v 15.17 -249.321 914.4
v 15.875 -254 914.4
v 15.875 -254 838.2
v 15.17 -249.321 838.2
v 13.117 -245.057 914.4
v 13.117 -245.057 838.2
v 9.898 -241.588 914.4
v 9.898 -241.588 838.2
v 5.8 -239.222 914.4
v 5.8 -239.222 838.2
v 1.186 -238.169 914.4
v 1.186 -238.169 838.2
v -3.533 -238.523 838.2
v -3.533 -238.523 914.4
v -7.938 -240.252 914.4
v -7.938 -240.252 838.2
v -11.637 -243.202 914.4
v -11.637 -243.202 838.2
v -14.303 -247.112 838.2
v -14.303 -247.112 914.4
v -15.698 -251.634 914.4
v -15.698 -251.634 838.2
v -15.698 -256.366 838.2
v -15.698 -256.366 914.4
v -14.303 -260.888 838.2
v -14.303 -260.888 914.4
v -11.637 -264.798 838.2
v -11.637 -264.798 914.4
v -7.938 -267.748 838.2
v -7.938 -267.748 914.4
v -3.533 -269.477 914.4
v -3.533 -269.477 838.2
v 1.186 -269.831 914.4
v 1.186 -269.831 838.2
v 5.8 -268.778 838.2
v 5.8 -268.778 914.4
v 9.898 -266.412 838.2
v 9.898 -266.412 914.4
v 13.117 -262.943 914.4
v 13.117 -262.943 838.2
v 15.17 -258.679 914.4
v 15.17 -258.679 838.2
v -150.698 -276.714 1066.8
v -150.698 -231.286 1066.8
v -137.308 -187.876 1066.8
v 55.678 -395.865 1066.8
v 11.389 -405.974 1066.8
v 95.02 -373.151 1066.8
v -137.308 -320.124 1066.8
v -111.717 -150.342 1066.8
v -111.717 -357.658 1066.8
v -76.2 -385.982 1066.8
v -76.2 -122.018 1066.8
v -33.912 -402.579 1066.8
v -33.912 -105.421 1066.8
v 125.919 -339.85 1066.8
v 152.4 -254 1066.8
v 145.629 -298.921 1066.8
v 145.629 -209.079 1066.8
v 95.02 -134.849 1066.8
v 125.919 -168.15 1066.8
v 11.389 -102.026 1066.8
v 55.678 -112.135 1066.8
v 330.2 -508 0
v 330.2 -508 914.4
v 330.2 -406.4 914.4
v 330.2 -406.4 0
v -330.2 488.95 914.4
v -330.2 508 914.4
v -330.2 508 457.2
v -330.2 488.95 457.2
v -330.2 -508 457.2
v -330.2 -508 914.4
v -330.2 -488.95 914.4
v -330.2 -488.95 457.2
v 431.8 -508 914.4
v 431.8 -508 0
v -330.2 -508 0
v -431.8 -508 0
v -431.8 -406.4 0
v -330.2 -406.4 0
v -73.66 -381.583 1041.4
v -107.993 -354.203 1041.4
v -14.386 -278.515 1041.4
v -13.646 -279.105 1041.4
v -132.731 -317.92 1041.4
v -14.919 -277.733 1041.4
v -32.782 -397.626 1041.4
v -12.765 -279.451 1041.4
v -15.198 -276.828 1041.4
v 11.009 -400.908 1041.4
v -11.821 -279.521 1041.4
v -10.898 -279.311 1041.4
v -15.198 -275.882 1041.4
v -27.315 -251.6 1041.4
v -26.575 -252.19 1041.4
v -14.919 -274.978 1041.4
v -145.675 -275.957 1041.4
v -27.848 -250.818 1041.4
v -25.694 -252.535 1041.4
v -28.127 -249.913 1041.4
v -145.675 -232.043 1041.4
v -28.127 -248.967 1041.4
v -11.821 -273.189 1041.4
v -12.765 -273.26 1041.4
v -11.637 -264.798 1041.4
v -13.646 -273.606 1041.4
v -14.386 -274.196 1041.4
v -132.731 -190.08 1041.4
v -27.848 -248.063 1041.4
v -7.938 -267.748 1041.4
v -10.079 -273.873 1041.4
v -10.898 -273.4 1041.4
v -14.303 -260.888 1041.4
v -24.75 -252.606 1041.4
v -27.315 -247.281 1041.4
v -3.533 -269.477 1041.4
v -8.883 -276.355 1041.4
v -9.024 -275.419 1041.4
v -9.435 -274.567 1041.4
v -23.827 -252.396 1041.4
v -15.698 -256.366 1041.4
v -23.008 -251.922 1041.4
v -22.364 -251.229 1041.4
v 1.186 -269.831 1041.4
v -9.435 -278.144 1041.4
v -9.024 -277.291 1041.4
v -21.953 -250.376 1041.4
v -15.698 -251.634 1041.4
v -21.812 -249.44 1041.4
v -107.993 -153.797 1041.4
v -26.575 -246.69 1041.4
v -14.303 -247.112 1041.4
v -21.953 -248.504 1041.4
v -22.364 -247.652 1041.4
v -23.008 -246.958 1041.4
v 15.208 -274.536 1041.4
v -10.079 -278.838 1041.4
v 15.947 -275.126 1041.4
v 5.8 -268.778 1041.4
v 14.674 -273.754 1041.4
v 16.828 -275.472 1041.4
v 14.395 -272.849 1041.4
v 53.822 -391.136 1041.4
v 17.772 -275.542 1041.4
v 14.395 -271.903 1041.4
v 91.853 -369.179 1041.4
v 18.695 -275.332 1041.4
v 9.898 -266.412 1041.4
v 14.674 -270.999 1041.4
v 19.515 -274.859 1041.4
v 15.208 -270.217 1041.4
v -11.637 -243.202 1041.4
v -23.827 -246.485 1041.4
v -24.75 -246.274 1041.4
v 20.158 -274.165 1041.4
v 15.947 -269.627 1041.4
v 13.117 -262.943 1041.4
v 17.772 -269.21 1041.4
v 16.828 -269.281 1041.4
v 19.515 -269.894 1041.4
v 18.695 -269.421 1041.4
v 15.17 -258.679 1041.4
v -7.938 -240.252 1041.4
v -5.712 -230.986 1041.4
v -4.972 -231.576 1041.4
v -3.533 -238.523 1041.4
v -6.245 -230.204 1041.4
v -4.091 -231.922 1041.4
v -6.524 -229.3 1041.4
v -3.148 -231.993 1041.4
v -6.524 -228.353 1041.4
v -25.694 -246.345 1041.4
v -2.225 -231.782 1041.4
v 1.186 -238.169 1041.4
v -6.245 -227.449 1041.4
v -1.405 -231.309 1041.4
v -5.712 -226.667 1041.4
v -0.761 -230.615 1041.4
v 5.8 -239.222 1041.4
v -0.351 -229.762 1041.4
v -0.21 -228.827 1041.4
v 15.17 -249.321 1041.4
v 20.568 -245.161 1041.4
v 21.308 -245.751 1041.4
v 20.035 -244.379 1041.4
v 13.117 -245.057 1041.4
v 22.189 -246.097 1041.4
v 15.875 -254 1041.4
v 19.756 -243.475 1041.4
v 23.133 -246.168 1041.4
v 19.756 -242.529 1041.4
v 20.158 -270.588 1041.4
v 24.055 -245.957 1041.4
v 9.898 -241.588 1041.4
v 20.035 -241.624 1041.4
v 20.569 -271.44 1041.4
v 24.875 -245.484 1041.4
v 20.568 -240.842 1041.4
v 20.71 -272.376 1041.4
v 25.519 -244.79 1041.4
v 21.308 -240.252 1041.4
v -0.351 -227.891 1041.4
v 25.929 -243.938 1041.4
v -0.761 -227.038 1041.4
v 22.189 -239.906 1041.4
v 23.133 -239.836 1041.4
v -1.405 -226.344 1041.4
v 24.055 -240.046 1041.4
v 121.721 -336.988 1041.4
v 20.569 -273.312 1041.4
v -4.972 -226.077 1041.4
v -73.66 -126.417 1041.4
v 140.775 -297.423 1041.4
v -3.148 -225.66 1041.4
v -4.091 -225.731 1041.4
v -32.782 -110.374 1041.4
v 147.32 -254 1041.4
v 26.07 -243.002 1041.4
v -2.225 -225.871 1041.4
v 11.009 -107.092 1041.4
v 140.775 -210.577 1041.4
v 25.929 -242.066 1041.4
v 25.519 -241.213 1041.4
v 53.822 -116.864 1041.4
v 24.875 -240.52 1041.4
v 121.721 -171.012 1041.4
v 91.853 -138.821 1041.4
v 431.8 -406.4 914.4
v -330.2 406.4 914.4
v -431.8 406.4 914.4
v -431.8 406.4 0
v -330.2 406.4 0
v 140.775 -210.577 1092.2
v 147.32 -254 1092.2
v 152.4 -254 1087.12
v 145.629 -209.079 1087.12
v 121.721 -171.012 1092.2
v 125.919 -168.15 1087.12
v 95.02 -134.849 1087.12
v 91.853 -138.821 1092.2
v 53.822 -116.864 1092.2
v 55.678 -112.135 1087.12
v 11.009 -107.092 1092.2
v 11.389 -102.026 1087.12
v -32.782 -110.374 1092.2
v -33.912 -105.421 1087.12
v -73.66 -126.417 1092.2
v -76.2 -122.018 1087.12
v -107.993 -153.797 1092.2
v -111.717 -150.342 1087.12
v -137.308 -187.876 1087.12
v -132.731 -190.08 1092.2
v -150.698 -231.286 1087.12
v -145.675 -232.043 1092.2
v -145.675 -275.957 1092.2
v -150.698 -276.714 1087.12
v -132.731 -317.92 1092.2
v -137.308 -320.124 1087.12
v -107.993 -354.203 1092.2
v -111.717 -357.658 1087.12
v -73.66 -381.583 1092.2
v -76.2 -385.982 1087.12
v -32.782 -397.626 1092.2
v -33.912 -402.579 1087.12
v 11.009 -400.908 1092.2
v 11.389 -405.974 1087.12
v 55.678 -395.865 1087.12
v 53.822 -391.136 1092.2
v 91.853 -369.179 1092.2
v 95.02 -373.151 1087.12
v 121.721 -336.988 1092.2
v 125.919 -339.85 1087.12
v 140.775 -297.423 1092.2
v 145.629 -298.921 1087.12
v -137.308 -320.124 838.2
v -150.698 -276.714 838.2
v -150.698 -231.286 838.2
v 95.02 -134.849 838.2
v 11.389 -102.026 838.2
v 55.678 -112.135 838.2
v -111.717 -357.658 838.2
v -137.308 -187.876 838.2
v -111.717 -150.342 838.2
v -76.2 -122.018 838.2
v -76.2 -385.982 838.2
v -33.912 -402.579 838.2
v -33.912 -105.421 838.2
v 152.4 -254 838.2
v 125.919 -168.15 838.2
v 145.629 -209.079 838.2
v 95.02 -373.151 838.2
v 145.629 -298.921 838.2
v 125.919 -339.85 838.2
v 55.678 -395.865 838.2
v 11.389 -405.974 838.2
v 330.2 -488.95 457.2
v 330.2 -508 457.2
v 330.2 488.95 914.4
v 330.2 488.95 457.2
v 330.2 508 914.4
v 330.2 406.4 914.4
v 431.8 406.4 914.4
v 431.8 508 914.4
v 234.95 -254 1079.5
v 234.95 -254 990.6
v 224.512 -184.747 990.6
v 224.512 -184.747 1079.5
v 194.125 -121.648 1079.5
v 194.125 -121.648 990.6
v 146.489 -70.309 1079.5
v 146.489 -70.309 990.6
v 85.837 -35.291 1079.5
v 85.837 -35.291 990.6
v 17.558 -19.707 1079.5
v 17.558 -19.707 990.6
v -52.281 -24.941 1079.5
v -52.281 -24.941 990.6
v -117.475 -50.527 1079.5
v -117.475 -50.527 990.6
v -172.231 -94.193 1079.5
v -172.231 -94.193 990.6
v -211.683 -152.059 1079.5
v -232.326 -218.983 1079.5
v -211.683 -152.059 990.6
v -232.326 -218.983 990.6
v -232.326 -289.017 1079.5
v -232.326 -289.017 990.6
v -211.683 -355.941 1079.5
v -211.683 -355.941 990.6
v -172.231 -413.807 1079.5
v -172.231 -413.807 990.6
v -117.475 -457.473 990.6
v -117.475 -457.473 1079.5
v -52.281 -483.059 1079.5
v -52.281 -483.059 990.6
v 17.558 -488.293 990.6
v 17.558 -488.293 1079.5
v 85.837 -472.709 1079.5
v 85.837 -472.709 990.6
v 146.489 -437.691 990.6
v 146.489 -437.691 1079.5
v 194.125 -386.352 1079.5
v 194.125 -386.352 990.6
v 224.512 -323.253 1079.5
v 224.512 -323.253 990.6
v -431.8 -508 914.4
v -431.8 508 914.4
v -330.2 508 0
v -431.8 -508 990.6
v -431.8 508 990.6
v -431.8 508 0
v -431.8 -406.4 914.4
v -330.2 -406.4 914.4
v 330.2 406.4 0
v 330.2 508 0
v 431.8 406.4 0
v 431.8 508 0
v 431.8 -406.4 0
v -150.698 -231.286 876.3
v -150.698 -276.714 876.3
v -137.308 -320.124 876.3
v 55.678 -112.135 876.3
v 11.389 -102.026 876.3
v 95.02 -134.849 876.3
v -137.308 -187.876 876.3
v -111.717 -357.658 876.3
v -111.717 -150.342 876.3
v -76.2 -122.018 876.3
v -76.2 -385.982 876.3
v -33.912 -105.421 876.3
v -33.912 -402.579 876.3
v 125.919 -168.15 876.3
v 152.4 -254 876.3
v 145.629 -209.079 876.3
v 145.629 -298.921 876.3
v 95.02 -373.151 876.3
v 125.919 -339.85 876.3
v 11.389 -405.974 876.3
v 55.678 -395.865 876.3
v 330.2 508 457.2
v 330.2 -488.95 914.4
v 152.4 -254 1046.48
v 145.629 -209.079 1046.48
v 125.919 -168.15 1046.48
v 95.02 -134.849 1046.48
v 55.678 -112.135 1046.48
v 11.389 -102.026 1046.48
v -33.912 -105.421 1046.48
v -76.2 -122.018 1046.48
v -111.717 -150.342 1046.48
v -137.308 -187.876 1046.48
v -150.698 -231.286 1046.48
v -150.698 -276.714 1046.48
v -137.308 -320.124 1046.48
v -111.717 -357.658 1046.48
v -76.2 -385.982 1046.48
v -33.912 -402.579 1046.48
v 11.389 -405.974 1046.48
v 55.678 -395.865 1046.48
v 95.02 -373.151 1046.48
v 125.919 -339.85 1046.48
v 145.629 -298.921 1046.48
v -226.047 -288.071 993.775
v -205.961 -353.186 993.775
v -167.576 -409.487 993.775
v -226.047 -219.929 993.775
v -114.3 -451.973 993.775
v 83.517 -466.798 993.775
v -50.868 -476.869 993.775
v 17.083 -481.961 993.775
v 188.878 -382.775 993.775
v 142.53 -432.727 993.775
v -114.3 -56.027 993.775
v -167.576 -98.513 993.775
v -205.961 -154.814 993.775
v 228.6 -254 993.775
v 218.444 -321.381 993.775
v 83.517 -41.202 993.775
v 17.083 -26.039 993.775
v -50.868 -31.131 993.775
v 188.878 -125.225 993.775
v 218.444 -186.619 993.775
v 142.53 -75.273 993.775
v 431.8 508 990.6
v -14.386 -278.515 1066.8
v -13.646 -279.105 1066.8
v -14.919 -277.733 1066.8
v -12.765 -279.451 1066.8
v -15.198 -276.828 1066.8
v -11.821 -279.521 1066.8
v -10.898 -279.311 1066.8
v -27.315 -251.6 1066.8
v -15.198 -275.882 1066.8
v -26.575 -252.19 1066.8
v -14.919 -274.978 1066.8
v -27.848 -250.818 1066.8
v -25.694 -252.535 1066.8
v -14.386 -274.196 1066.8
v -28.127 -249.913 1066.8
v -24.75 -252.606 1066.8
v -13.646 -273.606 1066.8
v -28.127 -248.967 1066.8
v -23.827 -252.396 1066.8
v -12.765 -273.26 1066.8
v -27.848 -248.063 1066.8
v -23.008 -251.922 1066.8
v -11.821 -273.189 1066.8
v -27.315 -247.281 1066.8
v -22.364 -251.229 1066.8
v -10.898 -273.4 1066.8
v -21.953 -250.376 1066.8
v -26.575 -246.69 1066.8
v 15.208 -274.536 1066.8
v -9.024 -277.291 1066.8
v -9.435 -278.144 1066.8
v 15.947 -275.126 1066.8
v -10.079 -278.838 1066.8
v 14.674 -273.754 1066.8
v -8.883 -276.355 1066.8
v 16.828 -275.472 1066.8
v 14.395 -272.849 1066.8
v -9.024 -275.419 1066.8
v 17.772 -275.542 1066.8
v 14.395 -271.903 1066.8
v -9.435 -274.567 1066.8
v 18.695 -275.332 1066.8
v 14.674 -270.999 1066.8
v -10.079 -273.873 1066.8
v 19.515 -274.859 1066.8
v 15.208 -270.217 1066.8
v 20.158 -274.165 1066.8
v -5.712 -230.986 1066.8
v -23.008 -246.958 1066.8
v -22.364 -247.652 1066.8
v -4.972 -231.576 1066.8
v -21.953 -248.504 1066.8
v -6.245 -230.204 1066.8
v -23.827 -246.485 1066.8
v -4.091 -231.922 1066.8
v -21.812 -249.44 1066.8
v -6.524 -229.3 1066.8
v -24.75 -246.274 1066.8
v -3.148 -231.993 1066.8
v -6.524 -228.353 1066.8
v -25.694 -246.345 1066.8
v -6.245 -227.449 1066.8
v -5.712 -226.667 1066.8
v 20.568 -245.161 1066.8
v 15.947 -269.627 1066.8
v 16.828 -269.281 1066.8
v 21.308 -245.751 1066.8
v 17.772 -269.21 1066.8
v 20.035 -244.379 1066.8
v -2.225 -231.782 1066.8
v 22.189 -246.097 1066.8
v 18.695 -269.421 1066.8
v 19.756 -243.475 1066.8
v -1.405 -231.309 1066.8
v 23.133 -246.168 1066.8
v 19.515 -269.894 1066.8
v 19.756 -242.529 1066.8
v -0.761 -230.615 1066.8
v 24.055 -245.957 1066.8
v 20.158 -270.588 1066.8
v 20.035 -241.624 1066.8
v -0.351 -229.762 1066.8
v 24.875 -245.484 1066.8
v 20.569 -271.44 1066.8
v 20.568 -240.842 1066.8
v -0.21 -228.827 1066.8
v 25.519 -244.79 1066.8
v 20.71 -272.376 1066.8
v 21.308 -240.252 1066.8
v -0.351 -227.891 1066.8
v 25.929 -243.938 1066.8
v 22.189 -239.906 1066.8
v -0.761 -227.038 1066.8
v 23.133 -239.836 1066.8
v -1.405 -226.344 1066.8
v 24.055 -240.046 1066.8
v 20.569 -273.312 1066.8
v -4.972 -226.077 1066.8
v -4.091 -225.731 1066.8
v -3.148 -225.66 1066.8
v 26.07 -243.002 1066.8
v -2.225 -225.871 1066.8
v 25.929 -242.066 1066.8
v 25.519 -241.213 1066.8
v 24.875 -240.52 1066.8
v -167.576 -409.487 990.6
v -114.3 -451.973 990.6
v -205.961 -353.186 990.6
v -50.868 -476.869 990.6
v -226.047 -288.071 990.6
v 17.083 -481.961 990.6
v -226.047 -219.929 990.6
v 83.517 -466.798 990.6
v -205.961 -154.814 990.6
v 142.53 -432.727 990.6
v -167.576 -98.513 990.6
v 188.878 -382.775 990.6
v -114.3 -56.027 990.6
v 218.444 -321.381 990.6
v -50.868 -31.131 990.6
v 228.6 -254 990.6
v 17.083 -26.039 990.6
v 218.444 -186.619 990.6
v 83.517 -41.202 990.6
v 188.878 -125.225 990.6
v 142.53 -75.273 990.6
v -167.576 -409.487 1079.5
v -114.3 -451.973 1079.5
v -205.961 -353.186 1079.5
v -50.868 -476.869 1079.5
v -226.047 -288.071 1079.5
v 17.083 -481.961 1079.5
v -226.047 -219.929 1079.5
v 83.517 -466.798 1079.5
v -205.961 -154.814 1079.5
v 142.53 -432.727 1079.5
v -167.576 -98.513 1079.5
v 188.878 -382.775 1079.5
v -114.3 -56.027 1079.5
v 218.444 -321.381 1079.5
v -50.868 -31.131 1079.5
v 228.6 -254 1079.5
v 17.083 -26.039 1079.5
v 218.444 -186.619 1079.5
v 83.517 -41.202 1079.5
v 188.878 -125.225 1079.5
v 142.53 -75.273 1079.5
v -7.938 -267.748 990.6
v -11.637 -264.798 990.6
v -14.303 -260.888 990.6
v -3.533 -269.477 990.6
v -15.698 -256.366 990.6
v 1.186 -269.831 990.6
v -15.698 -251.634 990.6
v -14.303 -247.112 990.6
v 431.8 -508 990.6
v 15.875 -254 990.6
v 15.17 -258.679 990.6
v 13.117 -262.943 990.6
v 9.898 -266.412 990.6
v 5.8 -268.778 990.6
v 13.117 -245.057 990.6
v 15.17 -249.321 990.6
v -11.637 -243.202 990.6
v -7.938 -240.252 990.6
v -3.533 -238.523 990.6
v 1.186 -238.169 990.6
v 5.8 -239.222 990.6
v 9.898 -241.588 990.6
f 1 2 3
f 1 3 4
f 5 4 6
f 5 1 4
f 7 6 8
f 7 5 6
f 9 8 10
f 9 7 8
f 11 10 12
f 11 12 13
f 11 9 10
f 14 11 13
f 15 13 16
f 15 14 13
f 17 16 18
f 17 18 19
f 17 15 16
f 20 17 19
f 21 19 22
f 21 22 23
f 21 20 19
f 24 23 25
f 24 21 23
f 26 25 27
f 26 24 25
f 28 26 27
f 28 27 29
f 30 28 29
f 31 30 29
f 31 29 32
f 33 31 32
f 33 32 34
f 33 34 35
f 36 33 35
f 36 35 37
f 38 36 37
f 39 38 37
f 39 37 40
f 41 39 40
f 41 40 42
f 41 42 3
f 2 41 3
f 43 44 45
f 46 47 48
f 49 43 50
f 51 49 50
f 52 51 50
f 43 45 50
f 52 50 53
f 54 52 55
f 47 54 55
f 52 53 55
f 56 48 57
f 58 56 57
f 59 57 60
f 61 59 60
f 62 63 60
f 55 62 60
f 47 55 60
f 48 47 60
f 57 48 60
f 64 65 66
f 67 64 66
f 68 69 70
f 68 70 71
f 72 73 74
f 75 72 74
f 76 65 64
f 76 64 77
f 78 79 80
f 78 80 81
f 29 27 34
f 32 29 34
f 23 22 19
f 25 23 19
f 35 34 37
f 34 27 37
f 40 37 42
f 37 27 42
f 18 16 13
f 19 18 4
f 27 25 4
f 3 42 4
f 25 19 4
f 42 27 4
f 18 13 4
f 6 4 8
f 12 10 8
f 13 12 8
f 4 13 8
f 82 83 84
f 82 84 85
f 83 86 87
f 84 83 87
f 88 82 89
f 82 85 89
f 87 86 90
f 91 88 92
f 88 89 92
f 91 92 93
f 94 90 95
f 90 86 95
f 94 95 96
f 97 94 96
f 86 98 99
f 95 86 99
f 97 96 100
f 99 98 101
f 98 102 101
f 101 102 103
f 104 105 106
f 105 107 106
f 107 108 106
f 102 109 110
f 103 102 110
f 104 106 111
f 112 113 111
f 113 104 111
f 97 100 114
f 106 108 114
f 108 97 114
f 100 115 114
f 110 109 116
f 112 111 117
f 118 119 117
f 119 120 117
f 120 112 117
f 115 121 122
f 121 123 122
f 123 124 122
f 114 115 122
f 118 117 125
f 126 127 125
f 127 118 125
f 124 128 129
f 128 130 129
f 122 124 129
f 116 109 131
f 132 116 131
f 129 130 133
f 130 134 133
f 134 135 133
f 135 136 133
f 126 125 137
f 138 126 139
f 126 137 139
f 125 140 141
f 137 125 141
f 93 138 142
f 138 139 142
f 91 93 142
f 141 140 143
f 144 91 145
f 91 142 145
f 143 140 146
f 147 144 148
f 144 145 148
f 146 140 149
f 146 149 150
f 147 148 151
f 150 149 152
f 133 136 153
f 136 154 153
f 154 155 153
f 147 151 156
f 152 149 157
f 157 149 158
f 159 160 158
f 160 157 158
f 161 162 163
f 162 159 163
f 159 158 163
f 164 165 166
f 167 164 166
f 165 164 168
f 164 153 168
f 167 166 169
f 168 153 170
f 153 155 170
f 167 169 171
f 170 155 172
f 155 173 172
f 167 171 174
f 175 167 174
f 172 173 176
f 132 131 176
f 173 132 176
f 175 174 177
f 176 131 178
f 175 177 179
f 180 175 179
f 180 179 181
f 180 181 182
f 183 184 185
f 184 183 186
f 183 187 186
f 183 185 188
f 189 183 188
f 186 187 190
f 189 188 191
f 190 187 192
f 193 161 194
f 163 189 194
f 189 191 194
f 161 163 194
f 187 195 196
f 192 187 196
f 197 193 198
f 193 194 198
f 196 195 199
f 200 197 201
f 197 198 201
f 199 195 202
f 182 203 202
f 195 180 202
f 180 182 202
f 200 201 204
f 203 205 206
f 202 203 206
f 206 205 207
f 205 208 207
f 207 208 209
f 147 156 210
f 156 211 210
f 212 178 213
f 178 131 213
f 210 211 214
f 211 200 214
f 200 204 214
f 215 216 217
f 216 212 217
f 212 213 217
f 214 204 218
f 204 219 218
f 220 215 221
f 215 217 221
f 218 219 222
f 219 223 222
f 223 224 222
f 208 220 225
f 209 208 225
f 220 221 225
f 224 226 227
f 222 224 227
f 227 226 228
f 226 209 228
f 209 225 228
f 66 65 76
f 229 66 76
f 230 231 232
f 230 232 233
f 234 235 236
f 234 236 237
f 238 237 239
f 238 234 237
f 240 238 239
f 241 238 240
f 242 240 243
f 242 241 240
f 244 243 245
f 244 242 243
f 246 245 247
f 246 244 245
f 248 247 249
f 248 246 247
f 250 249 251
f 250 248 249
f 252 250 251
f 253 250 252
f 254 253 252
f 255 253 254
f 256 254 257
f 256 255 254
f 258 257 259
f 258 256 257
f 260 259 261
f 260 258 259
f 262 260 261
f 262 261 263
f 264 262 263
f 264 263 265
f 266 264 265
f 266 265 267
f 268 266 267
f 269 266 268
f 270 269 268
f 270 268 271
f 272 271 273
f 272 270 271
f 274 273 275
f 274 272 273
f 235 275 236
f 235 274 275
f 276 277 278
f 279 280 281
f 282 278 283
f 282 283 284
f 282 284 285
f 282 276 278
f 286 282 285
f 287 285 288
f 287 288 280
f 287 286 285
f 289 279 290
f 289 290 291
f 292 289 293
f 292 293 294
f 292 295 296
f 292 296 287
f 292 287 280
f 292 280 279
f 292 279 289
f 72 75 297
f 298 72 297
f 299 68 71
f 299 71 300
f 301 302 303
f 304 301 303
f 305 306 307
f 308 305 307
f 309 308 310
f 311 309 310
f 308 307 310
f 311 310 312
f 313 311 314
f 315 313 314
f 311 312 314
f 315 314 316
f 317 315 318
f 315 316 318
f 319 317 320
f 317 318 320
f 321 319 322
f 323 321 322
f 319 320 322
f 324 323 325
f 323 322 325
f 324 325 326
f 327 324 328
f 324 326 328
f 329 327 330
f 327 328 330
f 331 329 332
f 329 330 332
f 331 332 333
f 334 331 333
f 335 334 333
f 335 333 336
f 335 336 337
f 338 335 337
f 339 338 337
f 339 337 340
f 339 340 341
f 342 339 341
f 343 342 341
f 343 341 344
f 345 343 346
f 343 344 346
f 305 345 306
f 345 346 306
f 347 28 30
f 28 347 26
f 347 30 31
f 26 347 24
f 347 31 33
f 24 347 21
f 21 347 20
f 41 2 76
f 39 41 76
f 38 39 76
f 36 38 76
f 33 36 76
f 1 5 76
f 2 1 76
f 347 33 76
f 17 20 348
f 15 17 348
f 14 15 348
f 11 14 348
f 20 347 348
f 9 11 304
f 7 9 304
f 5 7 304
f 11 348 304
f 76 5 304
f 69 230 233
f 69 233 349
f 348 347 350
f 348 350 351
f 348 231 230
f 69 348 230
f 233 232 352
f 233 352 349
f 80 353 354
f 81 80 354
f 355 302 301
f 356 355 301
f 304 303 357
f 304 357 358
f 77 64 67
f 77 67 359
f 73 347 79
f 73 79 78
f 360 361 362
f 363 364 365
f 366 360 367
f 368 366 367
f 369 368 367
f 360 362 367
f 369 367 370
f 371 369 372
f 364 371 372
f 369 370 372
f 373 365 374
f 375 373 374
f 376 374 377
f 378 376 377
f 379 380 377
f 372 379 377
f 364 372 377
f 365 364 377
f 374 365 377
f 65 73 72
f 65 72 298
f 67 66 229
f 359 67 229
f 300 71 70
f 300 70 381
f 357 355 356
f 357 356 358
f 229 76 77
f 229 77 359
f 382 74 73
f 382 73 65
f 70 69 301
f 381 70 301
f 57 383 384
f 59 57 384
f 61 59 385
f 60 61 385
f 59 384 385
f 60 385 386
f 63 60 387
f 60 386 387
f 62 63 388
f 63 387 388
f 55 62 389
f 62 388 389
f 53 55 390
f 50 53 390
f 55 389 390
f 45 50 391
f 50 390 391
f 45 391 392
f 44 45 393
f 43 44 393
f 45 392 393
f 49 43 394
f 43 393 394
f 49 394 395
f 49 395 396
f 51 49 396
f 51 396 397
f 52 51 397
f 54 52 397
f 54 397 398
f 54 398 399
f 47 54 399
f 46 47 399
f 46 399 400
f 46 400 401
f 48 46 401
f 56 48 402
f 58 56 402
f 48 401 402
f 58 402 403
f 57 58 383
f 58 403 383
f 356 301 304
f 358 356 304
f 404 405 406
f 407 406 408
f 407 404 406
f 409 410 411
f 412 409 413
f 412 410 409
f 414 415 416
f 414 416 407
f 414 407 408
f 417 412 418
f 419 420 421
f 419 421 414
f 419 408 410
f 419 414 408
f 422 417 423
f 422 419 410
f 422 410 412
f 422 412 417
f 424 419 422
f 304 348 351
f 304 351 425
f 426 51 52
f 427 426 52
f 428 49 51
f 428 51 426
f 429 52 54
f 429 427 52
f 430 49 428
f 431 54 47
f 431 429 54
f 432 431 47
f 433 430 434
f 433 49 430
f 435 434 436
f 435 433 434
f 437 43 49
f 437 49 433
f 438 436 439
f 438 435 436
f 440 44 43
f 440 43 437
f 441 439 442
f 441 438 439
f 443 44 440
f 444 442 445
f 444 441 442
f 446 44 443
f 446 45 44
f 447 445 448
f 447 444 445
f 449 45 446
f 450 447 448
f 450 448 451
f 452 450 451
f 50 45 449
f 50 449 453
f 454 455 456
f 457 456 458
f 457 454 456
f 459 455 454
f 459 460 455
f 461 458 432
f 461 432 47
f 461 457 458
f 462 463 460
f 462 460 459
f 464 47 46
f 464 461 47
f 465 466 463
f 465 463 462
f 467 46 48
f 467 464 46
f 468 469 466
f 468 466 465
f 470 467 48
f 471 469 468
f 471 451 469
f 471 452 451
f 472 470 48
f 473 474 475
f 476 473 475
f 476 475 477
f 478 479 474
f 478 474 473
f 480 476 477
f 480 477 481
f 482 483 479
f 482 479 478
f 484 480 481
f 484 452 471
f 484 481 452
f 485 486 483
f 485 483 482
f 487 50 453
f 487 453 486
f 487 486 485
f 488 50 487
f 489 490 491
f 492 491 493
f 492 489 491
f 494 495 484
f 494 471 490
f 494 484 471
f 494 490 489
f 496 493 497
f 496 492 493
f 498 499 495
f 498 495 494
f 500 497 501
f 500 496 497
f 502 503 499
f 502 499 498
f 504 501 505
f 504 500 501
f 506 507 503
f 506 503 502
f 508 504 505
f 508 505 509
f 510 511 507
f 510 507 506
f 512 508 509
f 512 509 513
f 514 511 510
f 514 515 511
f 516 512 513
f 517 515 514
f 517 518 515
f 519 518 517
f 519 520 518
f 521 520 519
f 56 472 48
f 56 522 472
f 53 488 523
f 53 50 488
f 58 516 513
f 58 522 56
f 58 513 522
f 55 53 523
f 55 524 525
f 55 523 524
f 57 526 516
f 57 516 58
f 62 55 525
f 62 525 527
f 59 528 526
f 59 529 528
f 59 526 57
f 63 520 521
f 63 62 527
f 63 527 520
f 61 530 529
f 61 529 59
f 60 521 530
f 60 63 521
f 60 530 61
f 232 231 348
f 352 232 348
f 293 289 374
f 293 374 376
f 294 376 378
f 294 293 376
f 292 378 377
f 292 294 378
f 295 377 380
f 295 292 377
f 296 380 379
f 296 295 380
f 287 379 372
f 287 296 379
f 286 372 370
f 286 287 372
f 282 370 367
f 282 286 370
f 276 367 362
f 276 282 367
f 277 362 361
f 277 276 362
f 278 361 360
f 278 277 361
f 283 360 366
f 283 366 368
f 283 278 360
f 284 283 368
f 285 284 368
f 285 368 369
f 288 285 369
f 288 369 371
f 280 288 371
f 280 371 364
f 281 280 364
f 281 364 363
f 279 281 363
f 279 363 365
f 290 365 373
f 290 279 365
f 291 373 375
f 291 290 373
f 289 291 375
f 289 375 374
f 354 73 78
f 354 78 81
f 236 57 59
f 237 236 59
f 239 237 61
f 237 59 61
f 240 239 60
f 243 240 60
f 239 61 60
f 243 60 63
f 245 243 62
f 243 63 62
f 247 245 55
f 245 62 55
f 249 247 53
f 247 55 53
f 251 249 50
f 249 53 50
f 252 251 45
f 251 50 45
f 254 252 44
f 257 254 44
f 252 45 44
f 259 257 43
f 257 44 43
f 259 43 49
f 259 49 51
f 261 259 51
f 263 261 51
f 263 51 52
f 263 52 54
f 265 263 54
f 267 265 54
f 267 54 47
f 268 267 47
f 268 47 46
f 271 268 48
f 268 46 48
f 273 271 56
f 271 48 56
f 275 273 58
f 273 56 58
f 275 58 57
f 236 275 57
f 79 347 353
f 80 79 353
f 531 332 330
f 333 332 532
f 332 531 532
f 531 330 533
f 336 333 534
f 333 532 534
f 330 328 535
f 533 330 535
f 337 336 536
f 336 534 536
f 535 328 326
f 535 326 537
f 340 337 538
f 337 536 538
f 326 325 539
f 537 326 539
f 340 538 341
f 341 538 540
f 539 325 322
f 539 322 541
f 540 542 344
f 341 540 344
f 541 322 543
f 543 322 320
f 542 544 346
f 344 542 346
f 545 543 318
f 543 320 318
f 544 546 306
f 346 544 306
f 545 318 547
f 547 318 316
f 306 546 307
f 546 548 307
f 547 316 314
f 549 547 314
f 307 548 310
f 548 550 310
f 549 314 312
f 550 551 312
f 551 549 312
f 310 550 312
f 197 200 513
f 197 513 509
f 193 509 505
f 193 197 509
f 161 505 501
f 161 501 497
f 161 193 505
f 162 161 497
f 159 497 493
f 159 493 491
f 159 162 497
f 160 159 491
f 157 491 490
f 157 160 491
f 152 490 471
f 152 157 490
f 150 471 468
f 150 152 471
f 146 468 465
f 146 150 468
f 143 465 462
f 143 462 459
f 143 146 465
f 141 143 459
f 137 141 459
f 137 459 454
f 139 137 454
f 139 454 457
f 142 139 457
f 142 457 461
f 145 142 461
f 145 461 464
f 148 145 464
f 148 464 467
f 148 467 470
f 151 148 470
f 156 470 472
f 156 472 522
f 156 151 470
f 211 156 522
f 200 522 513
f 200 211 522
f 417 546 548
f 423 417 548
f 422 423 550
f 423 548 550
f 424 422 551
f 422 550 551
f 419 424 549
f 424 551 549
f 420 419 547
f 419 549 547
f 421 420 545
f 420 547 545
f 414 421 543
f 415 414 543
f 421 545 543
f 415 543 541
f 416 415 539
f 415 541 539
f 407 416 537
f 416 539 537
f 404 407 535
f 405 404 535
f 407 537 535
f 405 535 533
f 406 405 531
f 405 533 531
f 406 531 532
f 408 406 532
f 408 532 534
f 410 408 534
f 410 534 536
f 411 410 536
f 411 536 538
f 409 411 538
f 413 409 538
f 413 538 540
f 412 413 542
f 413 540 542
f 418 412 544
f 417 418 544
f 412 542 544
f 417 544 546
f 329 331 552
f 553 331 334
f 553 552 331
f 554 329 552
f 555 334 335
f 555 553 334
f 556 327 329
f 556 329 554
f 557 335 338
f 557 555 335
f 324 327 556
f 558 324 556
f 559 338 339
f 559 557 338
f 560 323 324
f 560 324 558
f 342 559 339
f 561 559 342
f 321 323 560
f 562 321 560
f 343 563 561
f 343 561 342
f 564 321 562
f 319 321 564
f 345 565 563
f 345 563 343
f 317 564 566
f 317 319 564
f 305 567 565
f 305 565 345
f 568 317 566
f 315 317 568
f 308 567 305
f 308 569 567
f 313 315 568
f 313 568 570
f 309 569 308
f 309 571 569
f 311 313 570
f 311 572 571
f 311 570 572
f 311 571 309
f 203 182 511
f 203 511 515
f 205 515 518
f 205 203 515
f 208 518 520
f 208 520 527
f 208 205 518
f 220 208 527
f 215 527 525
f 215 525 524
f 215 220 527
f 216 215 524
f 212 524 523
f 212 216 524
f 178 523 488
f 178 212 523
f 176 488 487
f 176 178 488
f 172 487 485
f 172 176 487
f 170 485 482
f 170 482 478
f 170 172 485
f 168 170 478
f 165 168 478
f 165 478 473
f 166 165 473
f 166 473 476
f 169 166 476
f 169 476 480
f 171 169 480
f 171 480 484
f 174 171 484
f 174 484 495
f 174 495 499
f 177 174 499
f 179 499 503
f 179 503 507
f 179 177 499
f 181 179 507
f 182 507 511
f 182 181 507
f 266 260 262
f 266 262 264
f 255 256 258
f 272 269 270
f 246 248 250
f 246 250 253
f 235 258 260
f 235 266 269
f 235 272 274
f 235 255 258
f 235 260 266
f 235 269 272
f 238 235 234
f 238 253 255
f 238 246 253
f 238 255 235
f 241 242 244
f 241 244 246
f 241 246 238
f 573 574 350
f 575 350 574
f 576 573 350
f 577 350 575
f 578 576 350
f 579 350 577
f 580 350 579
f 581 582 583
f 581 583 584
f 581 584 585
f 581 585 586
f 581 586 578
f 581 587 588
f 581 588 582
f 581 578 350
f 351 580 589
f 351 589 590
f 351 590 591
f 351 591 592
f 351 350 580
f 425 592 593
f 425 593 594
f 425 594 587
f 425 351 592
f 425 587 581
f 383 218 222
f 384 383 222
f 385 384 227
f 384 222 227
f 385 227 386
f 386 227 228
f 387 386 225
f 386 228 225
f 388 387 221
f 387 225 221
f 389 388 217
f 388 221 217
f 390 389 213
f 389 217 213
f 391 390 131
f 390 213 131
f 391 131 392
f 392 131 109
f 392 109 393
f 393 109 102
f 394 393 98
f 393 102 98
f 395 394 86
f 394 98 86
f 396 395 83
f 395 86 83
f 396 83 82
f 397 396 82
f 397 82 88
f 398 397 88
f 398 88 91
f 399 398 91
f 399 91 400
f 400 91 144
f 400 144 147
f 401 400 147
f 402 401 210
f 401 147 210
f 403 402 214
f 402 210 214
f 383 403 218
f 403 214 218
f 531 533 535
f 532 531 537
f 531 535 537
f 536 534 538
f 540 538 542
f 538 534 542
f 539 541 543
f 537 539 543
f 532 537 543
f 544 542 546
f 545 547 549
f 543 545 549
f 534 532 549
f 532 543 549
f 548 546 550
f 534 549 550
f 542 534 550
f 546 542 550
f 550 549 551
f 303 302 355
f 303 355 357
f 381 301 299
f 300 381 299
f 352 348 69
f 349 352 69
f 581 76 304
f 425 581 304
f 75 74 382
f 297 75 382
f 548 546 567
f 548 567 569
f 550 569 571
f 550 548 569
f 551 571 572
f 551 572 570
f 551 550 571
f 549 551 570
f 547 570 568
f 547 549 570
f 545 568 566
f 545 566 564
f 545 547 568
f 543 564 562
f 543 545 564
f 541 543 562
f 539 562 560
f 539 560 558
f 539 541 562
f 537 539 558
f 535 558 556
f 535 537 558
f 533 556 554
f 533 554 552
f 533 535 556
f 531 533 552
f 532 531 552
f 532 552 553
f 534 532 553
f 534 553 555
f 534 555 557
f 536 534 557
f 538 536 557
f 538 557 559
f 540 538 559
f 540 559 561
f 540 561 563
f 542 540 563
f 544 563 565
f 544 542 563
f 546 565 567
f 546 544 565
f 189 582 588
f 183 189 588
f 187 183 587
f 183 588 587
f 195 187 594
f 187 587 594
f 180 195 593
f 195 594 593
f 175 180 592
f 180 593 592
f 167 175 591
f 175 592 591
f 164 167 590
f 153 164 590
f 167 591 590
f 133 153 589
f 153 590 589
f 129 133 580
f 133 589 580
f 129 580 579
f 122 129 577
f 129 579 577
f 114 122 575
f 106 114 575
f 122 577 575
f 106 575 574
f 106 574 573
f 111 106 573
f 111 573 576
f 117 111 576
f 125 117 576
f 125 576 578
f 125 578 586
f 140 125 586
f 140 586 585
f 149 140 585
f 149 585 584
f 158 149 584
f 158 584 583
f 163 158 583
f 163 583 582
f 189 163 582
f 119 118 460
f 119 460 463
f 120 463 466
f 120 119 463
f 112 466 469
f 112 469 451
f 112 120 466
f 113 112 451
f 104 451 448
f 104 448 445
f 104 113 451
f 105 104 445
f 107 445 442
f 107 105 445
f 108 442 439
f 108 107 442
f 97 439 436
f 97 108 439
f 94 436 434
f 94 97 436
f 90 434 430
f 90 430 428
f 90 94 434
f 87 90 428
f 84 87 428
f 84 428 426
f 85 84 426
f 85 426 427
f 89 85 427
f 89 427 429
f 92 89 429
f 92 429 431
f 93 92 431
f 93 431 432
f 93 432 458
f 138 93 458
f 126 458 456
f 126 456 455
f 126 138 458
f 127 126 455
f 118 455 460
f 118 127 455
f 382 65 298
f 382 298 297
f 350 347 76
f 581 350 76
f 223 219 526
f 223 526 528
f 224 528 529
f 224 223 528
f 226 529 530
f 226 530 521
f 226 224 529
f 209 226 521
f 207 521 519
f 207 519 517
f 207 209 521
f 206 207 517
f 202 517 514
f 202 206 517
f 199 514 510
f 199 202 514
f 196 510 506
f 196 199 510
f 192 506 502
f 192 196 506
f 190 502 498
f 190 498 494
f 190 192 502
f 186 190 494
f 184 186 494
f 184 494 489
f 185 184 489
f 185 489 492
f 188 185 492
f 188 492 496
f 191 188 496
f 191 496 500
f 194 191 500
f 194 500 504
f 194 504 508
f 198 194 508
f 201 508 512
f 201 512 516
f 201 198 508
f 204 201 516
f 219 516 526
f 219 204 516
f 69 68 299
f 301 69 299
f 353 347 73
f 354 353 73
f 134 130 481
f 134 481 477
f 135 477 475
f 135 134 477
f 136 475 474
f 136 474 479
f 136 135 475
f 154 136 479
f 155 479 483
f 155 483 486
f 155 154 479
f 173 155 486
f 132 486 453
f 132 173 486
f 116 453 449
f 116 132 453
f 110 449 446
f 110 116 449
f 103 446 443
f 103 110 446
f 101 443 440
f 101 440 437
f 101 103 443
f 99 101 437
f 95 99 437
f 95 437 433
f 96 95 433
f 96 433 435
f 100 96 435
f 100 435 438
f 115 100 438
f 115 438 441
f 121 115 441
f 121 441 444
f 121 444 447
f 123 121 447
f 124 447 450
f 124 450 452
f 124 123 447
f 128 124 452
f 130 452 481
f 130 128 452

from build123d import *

# Parameters (mm, degrees)
F0_W          = 101.6
F0_H          = 101.6
F1_DEPTH      = 914.4
F2_W          = 863.6
F2_H          = 1016
F3_DEPTH      = 76.2
F5_D          = 31.75
F6_R          = 15.875
F7_DEPTH      = 50.8
F7_DEPTH_BACK = 152.4
F8_R          = 152.4
F8_R_2        = 3.175
F9_DEPTH      = 25.4
F10_R         = 152.4
F11_DEPTH     = 25.4
F12_SIZE      = 5.08
F12_2_SIZE    = 5.08
F13_R         = 234.95
F13_R_2       = 228.6
F14_DEPTH     = 88.9
F15_R         = 228.6
F16_DEPTH     = 3.175
F17_R         = 152.4
F18_DEPTH     = 38.1
F19_W         = 660.4
F19_H         = 19.05
F20_DEPTH     = 457.2


with BuildPart() as f1:
    # F0 (on Top) → F1 (new body)
    with BuildSketch(Plane.XY):
        with Locations((-381, 457.2)):
            Rectangle(F0_W, F0_H)
        with Locations((381, 457.2)):
            Rectangle(F0_W, F0_H)
        with Locations((381, -457.2)):
            Rectangle(F0_W, F0_H)
        with Locations((-381, -457.2)):
            Rectangle(F0_W, F0_H)
    extrude(amount=F1_DEPTH)


with BuildPart() as f3:
    # F2 (on face) → F3 (new body)
    with BuildSketch(Plane.XY.offset(914.4)):
        Rectangle(F2_W, F2_H)
    extrude(amount=F3_DEPTH)

    # F5 (through all)
    with Locations(Plane.XY.offset(990.6)):
        with Locations((0, -254)):
            Hole(F5_D / 2)

    # F6 (on face) → F7 (join, two sides)
    with BuildSketch(Plane.XY.offset(990.6)) as f7_sk:
        with Locations((0, -254)):
            Circle(F6_R)
    extrude(amount=F7_DEPTH)
    extrude(f7_sk.sketch, amount=-F7_DEPTH_BACK)

    # F8 (on face) → F9 (join)
    with BuildSketch(Plane.XY.offset(1041.4)):
        with Locations((0, -254)):
            Circle(F8_R)
        with Locations((-12.058235, -276.355289)):
            Circle(F8_R_2, mode=Mode.SUBTRACT)
        with Locations((17.534944, -272.376228)):
            Circle(F8_R_2, mode=Mode.SUBTRACT)
        with Locations((-24.987343, -249.440101)):
            Circle(F8_R_2, mode=Mode.SUBTRACT)
        with Locations((-3.384792, -228.826538)):
            Circle(F8_R_2, mode=Mode.SUBTRACT)
        with Locations((22.895427, -243.001844)):
            Circle(F8_R_2, mode=Mode.SUBTRACT)
    extrude(amount=F9_DEPTH)

    # F12#2
    f12_2_edges = [f3.edges().sort_by_distance(p)[0] for p in [
        (-152.4, -254, 1041.4),
    ]]
    chamfer(f12_2_edges, length=F12_2_SIZE)


with BuildPart() as f11:
    # F10 (on face) → F11 (new body)
    with BuildSketch(Plane.XY.offset(1066.8)):
        with Locations((0, -254)):
            Circle(F10_R)
    extrude(amount=F11_DEPTH)

    # F12
    f12_edges = [f11.edges().sort_by_distance(p)[0] for p in [
        (-152.4, -254, 1092.2),
    ]]
    chamfer(f12_edges, length=F12_SIZE)


with BuildPart() as f14:
    # F13 (on face) → F14 (new body)
    with BuildSketch(Plane.XY.offset(990.6)):
        with Locations((0, -254)):
            Circle(F13_R)
        with Locations((0, -254)):
            Circle(F13_R_2, mode=Mode.SUBTRACT)
    extrude(amount=F14_DEPTH)


with BuildPart() as f16:
    # F15 (on face) → F16 (new body)
    with BuildSketch(Plane.XY.offset(990.6)):
        with Locations((0, -254)):
            Circle(F15_R)
    extrude(amount=F16_DEPTH)


with BuildPart() as f18:
    # F17 (on face) → F18 (new body)
    with BuildSketch(Plane(origin=(0, 0, 838.2), x_dir=(1, 0, 0), z_dir=(0, 0, -1))):
        with Locations((0, 254)):
            Circle(F17_R)
    extrude(amount=-F18_DEPTH)


with BuildPart() as f20:
    # F19 (on face) → F20 (new body)
    with BuildSketch(Plane(origin=(0, 0, 914.4), x_dir=(1, 0, 0), z_dir=(0, 0, -1))):
        with Locations((0, -498.475)):
            Rectangle(F19_W, F19_H)
    extrude(amount=F20_DEPTH)


with BuildPart() as f21_1:
    # F21: instance of F20
    add(f20.part.mirror(Plane.XZ))


solid = Compound([f1.part, f3.part, f11.part, f14.part, f16.part, f18.part, f20.part, f21_1.part])
